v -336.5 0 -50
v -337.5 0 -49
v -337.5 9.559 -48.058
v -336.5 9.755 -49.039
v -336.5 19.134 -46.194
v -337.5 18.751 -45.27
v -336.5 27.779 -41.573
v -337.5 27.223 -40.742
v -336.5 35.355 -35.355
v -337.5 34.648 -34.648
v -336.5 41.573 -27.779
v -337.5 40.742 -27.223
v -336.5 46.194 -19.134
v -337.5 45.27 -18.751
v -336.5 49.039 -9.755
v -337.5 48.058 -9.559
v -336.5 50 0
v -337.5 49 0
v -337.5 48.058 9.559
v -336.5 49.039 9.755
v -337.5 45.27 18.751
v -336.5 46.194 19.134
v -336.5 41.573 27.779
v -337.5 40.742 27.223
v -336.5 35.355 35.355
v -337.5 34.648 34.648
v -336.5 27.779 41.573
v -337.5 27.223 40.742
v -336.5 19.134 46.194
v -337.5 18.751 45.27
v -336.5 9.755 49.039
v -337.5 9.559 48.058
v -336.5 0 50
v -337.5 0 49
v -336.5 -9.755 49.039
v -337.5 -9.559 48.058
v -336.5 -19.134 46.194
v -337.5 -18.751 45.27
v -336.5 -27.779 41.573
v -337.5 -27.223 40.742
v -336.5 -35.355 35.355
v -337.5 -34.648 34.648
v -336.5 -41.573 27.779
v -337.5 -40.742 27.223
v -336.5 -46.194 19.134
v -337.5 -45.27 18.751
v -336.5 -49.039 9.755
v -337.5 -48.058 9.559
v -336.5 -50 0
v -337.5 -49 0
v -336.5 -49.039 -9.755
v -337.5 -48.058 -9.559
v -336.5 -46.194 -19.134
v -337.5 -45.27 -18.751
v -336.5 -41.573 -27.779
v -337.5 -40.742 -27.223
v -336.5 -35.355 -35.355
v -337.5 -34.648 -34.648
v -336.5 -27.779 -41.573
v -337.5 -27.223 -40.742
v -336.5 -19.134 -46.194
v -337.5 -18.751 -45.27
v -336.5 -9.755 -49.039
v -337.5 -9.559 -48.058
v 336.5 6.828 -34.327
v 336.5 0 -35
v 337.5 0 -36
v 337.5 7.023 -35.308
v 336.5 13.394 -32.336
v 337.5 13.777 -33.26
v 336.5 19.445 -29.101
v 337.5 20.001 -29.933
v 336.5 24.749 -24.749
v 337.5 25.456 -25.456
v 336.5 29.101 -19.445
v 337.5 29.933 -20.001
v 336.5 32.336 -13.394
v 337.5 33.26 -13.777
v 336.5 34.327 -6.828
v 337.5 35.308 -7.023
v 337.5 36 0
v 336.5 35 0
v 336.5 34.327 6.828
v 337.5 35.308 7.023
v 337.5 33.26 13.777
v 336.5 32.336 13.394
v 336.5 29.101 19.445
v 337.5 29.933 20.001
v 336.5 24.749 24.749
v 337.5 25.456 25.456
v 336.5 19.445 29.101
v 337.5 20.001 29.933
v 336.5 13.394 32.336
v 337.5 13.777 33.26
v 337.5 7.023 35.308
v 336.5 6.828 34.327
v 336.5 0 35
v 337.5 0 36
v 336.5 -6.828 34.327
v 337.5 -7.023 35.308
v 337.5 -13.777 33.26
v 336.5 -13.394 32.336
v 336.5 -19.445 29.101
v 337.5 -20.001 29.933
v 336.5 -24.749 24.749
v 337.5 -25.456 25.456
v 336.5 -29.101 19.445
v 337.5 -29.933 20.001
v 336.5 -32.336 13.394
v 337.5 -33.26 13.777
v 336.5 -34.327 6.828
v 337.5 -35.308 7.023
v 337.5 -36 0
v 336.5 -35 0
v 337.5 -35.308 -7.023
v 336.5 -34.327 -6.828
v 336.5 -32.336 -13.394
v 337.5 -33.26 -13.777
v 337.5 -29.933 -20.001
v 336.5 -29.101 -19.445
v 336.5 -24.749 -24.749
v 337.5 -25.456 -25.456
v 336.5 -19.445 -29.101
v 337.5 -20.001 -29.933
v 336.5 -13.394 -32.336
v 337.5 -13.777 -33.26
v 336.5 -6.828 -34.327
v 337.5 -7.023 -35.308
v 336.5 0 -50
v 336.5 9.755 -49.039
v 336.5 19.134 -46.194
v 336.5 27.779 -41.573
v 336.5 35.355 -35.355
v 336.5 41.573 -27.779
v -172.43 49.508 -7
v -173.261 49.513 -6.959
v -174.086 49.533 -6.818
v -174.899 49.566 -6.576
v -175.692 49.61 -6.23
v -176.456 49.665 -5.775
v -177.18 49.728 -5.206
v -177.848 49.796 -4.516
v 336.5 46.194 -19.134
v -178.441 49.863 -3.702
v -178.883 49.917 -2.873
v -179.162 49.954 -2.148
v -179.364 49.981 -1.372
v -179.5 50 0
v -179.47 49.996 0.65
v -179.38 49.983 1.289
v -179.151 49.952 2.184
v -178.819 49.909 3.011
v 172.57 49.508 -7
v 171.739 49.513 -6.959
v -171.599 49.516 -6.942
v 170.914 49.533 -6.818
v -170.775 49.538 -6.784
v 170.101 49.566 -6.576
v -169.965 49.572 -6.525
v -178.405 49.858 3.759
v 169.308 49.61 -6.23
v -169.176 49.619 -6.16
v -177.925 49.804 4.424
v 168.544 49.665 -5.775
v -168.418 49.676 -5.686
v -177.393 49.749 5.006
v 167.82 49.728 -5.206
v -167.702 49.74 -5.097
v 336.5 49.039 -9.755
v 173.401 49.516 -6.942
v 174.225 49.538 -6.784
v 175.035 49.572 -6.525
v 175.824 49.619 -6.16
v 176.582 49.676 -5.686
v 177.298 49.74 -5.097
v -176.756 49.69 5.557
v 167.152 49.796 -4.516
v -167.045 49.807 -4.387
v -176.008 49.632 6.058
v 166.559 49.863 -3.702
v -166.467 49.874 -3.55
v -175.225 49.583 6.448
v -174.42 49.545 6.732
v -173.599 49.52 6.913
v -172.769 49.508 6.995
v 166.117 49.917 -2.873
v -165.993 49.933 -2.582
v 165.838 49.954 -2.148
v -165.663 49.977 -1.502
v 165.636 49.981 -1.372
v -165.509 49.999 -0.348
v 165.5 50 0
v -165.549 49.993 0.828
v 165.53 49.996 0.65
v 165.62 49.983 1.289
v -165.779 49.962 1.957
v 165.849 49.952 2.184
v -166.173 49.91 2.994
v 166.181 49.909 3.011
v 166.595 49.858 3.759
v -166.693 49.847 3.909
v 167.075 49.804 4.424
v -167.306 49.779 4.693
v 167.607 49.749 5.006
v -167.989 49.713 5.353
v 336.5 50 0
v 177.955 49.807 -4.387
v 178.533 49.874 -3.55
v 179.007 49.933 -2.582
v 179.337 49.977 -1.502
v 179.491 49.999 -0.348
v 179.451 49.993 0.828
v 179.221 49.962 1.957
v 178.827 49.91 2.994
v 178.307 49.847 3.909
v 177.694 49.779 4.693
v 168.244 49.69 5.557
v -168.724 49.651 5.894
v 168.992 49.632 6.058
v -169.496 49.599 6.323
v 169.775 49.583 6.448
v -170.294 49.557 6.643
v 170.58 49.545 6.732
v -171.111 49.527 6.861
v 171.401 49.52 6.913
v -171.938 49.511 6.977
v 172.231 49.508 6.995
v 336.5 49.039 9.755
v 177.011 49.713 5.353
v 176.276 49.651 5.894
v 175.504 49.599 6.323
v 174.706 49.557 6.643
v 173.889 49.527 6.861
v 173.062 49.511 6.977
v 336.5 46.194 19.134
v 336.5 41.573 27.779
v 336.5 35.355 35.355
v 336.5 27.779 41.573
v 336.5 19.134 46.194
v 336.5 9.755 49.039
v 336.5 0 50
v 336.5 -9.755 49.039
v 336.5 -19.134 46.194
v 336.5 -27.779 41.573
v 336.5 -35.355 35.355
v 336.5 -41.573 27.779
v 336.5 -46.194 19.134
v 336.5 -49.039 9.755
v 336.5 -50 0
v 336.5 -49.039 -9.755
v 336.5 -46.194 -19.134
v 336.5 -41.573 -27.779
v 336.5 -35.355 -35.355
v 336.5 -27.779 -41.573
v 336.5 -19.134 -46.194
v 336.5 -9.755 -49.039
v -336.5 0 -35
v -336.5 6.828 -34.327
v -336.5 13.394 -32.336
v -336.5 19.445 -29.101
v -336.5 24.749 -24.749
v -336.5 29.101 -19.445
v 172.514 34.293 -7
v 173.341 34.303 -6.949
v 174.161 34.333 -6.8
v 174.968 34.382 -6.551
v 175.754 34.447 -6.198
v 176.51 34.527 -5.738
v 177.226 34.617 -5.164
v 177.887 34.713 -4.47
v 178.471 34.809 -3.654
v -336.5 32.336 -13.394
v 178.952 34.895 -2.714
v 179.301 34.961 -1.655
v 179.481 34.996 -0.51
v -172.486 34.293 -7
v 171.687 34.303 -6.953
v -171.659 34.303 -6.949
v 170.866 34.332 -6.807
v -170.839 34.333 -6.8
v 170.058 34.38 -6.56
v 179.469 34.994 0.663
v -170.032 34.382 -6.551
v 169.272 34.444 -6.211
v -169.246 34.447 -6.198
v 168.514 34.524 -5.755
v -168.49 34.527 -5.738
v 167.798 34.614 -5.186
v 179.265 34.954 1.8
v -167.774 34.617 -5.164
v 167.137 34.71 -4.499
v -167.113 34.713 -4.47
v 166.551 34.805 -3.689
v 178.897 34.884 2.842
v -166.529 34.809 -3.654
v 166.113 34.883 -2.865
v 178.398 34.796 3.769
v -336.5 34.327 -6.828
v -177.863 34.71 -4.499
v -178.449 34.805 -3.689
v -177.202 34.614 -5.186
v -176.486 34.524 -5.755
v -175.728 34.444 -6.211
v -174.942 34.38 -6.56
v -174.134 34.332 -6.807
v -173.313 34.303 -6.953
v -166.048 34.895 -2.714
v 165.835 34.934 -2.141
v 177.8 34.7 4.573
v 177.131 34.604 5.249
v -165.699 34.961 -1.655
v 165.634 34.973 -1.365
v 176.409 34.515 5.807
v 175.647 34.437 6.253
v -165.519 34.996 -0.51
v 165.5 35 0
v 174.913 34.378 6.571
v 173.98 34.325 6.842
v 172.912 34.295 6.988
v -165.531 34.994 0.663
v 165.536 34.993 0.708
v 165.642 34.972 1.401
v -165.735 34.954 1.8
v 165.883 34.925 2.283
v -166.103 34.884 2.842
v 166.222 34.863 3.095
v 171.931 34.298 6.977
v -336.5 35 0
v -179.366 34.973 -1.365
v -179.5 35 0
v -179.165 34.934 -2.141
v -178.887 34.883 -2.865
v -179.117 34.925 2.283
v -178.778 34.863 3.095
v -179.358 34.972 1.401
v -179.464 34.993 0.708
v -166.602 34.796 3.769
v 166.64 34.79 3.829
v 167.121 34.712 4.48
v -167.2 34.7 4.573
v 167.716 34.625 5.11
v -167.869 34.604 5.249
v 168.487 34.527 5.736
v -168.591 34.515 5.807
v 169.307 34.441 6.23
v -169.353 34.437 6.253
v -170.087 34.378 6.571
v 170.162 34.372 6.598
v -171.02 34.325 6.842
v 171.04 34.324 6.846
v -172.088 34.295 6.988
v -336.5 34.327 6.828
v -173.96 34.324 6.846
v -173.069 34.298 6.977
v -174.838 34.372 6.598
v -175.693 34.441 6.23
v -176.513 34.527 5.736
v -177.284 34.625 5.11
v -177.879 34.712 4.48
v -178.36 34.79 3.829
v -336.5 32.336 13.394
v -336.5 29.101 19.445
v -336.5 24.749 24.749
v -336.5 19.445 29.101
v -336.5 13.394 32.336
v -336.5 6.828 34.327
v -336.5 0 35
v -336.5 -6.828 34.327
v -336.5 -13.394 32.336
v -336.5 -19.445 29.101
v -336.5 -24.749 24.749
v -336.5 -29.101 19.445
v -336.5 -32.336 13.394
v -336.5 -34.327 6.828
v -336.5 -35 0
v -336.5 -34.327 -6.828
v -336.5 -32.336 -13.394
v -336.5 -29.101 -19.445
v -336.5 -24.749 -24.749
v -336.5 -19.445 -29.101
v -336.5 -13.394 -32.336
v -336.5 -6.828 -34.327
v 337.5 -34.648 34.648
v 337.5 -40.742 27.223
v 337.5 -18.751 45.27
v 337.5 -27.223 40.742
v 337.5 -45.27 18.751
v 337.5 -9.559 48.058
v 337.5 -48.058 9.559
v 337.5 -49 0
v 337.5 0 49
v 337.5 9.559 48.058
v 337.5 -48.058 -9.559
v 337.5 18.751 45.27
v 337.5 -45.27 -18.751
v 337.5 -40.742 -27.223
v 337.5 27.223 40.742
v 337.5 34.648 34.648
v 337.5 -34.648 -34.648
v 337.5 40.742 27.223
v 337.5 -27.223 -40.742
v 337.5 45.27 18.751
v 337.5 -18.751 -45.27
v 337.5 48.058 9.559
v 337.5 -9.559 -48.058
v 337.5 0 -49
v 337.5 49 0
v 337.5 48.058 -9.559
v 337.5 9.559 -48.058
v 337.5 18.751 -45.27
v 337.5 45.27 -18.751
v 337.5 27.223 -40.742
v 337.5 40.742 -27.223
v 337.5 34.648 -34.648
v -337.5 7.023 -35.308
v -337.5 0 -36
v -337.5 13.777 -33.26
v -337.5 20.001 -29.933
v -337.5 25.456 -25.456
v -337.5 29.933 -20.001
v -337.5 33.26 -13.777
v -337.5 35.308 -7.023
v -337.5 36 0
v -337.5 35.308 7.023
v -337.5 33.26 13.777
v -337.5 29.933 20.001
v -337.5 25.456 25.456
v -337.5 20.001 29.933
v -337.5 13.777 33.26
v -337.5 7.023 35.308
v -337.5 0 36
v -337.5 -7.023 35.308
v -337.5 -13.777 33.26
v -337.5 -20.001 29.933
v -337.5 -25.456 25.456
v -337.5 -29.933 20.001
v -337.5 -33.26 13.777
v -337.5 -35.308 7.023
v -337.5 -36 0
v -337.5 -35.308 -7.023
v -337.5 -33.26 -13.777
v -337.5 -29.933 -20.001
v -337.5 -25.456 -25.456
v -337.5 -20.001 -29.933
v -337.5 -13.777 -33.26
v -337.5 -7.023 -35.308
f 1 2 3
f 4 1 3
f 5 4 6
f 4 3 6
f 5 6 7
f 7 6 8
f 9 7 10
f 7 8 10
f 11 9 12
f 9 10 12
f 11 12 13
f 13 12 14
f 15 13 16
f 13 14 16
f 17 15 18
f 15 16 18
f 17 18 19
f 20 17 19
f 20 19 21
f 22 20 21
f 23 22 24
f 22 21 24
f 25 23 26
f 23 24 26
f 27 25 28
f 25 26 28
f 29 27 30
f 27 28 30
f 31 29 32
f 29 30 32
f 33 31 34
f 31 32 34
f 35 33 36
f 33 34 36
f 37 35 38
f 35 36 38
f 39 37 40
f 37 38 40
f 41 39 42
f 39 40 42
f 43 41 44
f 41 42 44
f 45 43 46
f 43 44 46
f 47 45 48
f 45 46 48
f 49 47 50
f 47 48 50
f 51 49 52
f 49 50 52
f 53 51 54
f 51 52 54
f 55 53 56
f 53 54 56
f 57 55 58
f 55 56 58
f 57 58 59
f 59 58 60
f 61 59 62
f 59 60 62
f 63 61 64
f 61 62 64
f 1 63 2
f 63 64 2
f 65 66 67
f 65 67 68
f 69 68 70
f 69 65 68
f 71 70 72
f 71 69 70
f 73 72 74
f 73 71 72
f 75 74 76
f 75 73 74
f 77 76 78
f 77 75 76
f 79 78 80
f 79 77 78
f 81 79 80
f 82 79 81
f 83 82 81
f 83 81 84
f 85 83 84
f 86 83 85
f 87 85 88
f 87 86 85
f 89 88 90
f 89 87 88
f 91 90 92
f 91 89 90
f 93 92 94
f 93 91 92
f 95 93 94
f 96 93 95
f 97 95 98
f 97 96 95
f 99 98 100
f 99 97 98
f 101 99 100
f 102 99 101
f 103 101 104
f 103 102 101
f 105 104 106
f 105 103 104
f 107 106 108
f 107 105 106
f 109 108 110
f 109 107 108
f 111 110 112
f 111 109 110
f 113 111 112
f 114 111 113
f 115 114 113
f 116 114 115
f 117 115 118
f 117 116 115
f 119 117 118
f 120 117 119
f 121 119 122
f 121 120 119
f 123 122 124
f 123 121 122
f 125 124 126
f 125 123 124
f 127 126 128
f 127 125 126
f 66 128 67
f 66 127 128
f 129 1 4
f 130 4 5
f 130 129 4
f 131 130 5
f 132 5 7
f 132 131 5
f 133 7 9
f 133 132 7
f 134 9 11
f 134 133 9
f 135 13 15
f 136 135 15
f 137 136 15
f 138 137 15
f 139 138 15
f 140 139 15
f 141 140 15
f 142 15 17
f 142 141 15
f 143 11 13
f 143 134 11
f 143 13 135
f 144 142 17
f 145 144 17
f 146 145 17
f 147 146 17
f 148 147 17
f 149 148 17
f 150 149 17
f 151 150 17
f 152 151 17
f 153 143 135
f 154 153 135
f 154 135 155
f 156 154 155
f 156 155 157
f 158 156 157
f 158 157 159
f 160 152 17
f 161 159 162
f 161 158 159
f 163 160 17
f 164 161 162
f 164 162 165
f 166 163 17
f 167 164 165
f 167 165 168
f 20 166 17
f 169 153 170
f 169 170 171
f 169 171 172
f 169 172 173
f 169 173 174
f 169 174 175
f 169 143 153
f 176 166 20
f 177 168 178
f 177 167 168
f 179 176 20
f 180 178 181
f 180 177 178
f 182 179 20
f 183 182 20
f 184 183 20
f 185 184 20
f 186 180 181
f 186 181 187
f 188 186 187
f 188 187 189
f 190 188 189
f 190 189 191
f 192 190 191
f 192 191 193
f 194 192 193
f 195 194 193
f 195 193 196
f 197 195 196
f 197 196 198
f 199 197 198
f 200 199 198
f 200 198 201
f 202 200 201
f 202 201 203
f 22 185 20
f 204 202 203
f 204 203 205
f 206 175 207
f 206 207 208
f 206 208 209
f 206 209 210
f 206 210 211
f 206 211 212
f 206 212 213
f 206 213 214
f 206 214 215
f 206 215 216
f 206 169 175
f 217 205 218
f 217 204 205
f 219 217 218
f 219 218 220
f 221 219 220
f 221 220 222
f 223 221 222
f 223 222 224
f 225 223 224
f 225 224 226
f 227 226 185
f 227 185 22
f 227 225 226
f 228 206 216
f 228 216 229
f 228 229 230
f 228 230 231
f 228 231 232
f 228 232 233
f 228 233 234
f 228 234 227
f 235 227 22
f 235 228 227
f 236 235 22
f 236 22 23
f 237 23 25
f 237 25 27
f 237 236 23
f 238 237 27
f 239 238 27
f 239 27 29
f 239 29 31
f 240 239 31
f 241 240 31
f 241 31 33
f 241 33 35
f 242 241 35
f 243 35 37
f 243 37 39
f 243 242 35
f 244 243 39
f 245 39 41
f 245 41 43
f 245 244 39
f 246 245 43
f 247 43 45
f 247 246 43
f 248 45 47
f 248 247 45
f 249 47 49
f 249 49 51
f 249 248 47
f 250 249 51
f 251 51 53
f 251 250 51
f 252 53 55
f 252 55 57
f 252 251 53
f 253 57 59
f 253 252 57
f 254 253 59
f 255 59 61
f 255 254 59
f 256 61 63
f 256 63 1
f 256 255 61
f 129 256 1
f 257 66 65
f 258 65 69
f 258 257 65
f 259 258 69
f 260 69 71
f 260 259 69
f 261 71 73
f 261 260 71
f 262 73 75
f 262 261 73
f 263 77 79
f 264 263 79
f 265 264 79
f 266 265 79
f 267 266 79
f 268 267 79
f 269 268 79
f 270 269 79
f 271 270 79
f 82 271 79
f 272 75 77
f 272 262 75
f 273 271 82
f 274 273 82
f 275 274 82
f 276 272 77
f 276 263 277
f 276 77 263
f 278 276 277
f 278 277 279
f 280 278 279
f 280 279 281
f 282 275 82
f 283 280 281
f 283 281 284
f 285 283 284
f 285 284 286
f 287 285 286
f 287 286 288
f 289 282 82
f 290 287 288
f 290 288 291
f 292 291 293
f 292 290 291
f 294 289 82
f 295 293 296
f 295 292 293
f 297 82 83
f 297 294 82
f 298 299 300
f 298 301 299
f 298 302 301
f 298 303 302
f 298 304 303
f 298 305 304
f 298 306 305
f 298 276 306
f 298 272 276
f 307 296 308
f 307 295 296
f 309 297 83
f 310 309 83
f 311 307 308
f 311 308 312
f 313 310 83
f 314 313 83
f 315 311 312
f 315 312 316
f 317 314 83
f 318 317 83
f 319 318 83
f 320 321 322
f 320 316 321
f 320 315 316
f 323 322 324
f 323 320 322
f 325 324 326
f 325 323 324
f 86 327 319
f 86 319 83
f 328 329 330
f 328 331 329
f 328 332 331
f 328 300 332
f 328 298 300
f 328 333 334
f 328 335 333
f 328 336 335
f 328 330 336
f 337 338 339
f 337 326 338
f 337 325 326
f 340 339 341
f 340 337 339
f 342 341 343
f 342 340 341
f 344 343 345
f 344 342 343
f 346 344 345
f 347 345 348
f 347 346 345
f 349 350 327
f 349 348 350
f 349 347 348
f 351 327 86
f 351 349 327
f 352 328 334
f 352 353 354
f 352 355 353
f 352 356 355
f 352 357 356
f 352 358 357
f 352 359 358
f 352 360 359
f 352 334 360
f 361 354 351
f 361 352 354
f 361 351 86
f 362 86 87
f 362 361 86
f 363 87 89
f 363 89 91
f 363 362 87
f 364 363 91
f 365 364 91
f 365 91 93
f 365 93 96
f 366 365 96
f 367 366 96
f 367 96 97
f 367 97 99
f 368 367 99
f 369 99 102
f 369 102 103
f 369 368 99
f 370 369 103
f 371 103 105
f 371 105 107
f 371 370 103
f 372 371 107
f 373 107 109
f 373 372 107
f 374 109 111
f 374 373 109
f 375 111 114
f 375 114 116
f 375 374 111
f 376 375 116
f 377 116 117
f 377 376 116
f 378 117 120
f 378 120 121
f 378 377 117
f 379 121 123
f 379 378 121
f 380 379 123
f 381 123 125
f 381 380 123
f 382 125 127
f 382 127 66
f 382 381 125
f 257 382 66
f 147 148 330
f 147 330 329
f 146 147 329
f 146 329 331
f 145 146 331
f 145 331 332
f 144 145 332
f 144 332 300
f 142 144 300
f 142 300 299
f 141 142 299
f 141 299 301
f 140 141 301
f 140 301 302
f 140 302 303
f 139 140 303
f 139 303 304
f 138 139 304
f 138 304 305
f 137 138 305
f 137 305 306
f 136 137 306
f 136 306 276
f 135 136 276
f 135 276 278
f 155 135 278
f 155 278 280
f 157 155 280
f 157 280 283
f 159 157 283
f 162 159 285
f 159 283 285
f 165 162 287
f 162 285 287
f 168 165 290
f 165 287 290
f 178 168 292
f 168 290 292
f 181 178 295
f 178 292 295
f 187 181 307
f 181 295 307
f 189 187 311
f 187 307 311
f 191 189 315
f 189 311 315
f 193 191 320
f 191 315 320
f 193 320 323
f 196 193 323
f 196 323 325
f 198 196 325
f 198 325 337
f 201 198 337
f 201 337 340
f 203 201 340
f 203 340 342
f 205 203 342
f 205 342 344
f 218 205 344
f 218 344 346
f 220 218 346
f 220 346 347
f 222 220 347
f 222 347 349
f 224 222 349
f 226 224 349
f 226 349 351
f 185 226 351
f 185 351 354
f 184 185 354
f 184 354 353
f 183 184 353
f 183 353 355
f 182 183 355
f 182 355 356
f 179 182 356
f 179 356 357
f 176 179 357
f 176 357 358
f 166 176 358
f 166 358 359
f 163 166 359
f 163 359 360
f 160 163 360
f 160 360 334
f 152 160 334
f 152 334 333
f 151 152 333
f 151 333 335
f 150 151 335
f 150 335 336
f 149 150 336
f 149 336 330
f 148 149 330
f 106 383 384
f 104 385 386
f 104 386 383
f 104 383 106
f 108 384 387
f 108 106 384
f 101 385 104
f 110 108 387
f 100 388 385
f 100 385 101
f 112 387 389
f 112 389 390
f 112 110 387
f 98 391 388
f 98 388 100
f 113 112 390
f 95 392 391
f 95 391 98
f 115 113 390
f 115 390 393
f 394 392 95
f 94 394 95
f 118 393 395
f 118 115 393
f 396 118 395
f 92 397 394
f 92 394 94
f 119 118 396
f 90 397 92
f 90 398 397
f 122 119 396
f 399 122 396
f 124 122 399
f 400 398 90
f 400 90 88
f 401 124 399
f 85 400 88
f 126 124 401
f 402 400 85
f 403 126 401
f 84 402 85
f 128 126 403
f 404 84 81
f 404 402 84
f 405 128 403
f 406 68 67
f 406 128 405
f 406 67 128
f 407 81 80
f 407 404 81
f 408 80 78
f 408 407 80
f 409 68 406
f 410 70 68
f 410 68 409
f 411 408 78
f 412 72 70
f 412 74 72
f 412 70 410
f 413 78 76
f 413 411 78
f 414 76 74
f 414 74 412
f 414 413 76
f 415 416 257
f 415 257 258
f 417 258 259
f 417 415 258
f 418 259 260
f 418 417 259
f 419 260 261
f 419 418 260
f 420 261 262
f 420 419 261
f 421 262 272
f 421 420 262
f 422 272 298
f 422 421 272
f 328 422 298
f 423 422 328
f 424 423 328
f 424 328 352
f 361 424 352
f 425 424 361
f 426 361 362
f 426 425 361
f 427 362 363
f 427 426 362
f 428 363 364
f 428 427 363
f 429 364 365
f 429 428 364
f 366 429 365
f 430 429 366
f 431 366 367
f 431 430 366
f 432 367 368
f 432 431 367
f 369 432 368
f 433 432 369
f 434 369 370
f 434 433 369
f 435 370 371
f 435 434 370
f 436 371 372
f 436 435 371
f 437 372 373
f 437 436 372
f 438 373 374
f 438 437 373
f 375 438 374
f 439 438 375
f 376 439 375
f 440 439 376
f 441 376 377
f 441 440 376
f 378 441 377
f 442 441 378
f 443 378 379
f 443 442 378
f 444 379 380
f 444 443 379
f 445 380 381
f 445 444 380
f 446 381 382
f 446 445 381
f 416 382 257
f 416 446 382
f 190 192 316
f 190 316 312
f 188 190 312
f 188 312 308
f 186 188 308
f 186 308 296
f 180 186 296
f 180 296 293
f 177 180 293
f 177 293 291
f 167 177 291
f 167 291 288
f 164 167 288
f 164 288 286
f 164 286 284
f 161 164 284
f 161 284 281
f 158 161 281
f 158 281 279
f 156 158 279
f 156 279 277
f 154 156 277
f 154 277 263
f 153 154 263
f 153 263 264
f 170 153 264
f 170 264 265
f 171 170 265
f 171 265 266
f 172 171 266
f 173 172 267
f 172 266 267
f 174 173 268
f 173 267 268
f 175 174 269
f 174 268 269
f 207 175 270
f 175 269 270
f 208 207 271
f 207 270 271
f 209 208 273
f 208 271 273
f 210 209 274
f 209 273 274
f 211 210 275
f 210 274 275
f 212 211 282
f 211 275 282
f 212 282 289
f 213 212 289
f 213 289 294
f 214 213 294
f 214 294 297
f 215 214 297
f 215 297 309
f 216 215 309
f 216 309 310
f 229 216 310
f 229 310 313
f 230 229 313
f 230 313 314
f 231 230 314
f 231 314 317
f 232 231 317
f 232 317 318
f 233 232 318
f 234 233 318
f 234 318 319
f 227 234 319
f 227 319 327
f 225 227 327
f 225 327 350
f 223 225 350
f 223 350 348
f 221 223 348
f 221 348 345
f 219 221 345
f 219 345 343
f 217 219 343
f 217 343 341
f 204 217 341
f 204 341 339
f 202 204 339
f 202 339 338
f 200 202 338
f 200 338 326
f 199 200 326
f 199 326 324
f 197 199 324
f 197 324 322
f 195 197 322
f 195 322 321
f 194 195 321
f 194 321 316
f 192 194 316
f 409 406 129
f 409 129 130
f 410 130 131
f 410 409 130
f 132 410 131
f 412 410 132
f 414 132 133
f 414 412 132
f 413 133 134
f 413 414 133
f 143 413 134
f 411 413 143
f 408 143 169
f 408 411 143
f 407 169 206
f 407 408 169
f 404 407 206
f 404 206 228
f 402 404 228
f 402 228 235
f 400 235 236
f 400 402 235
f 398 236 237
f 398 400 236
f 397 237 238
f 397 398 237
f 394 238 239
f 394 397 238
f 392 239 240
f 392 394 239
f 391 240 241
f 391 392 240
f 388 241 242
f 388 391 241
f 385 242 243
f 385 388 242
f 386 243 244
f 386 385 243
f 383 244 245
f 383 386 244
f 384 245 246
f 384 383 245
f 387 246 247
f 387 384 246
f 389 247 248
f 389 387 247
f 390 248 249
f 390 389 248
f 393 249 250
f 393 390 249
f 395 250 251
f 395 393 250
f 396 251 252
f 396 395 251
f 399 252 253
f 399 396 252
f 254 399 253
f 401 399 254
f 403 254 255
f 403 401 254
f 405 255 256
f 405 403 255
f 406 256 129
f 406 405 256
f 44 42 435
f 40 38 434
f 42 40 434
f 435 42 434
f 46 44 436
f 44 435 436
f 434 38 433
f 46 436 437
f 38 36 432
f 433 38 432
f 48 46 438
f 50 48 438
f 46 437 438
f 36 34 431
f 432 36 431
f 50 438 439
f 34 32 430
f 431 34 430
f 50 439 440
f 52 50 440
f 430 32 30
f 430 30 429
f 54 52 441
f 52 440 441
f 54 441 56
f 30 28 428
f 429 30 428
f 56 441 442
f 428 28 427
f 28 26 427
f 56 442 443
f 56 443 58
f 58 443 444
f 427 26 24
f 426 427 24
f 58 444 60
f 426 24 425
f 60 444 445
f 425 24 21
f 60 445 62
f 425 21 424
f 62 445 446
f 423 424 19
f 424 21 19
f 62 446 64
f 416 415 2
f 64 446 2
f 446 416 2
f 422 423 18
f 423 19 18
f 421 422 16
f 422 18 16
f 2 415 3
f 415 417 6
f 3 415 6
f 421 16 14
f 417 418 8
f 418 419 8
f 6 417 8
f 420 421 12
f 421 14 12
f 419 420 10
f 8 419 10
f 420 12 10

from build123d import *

# Parameters (mm, degrees)
SKETCH_1_R              = 50
SKETCH_1_R_2            = 35
EXTRUDE_1_DEPTH         = 337.5
CHAMFER_1_SIZE          = 1
HOLE_WIZARD_M16_1_D     = 14
HOLE_WIZARD_M16_1_DEPTH = 42
HOLE_WIZARD_M16_1_TIP   = 4.206024333


with BuildPart() as part:
    # 草图1 → 凸台-拉伸1 (new, symmetric)
    with BuildSketch(Plane(origin=(0, 0, 0), x_dir=(0, 0, -1), z_dir=(1, 0, 0))):
        Circle(SKETCH_1_R)
        Circle(SKETCH_1_R_2, mode=Mode.SUBTRACT)
    extrude(amount=EXTRUDE_1_DEPTH, both=True)

    # 倒角1
    chamfer_1_edges = [part.edges().sort_by_distance(p)[0] for p in [
        (-337.5, 0, 50),
        (337.5, 0, 50),
        (-337.5, 0, 35),
        (337.5, 0, 35),
    ]]
    chamfer(chamfer_1_edges, length=CHAMFER_1_SIZE)

    # M16 螺纹孔1
    with Locations(Plane(origin=(0, 50, 0), x_dir=(1, 0, 0), z_dir=(0, 1, 0))):
        with Locations((172.5, 0), (-172.5, 0)):
            Hole(HOLE_WIZARD_M16_1_D / 2, depth=HOLE_WIZARD_M16_1_DEPTH)
            with Locations((0, 0, -(HOLE_WIZARD_M16_1_DEPTH + HOLE_WIZARD_M16_1_TIP / 2))):  # 118° drill point
                Cone(0, HOLE_WIZARD_M16_1_D / 2, HOLE_WIZARD_M16_1_TIP, mode=Mode.SUBTRACT)


solid = part.part
